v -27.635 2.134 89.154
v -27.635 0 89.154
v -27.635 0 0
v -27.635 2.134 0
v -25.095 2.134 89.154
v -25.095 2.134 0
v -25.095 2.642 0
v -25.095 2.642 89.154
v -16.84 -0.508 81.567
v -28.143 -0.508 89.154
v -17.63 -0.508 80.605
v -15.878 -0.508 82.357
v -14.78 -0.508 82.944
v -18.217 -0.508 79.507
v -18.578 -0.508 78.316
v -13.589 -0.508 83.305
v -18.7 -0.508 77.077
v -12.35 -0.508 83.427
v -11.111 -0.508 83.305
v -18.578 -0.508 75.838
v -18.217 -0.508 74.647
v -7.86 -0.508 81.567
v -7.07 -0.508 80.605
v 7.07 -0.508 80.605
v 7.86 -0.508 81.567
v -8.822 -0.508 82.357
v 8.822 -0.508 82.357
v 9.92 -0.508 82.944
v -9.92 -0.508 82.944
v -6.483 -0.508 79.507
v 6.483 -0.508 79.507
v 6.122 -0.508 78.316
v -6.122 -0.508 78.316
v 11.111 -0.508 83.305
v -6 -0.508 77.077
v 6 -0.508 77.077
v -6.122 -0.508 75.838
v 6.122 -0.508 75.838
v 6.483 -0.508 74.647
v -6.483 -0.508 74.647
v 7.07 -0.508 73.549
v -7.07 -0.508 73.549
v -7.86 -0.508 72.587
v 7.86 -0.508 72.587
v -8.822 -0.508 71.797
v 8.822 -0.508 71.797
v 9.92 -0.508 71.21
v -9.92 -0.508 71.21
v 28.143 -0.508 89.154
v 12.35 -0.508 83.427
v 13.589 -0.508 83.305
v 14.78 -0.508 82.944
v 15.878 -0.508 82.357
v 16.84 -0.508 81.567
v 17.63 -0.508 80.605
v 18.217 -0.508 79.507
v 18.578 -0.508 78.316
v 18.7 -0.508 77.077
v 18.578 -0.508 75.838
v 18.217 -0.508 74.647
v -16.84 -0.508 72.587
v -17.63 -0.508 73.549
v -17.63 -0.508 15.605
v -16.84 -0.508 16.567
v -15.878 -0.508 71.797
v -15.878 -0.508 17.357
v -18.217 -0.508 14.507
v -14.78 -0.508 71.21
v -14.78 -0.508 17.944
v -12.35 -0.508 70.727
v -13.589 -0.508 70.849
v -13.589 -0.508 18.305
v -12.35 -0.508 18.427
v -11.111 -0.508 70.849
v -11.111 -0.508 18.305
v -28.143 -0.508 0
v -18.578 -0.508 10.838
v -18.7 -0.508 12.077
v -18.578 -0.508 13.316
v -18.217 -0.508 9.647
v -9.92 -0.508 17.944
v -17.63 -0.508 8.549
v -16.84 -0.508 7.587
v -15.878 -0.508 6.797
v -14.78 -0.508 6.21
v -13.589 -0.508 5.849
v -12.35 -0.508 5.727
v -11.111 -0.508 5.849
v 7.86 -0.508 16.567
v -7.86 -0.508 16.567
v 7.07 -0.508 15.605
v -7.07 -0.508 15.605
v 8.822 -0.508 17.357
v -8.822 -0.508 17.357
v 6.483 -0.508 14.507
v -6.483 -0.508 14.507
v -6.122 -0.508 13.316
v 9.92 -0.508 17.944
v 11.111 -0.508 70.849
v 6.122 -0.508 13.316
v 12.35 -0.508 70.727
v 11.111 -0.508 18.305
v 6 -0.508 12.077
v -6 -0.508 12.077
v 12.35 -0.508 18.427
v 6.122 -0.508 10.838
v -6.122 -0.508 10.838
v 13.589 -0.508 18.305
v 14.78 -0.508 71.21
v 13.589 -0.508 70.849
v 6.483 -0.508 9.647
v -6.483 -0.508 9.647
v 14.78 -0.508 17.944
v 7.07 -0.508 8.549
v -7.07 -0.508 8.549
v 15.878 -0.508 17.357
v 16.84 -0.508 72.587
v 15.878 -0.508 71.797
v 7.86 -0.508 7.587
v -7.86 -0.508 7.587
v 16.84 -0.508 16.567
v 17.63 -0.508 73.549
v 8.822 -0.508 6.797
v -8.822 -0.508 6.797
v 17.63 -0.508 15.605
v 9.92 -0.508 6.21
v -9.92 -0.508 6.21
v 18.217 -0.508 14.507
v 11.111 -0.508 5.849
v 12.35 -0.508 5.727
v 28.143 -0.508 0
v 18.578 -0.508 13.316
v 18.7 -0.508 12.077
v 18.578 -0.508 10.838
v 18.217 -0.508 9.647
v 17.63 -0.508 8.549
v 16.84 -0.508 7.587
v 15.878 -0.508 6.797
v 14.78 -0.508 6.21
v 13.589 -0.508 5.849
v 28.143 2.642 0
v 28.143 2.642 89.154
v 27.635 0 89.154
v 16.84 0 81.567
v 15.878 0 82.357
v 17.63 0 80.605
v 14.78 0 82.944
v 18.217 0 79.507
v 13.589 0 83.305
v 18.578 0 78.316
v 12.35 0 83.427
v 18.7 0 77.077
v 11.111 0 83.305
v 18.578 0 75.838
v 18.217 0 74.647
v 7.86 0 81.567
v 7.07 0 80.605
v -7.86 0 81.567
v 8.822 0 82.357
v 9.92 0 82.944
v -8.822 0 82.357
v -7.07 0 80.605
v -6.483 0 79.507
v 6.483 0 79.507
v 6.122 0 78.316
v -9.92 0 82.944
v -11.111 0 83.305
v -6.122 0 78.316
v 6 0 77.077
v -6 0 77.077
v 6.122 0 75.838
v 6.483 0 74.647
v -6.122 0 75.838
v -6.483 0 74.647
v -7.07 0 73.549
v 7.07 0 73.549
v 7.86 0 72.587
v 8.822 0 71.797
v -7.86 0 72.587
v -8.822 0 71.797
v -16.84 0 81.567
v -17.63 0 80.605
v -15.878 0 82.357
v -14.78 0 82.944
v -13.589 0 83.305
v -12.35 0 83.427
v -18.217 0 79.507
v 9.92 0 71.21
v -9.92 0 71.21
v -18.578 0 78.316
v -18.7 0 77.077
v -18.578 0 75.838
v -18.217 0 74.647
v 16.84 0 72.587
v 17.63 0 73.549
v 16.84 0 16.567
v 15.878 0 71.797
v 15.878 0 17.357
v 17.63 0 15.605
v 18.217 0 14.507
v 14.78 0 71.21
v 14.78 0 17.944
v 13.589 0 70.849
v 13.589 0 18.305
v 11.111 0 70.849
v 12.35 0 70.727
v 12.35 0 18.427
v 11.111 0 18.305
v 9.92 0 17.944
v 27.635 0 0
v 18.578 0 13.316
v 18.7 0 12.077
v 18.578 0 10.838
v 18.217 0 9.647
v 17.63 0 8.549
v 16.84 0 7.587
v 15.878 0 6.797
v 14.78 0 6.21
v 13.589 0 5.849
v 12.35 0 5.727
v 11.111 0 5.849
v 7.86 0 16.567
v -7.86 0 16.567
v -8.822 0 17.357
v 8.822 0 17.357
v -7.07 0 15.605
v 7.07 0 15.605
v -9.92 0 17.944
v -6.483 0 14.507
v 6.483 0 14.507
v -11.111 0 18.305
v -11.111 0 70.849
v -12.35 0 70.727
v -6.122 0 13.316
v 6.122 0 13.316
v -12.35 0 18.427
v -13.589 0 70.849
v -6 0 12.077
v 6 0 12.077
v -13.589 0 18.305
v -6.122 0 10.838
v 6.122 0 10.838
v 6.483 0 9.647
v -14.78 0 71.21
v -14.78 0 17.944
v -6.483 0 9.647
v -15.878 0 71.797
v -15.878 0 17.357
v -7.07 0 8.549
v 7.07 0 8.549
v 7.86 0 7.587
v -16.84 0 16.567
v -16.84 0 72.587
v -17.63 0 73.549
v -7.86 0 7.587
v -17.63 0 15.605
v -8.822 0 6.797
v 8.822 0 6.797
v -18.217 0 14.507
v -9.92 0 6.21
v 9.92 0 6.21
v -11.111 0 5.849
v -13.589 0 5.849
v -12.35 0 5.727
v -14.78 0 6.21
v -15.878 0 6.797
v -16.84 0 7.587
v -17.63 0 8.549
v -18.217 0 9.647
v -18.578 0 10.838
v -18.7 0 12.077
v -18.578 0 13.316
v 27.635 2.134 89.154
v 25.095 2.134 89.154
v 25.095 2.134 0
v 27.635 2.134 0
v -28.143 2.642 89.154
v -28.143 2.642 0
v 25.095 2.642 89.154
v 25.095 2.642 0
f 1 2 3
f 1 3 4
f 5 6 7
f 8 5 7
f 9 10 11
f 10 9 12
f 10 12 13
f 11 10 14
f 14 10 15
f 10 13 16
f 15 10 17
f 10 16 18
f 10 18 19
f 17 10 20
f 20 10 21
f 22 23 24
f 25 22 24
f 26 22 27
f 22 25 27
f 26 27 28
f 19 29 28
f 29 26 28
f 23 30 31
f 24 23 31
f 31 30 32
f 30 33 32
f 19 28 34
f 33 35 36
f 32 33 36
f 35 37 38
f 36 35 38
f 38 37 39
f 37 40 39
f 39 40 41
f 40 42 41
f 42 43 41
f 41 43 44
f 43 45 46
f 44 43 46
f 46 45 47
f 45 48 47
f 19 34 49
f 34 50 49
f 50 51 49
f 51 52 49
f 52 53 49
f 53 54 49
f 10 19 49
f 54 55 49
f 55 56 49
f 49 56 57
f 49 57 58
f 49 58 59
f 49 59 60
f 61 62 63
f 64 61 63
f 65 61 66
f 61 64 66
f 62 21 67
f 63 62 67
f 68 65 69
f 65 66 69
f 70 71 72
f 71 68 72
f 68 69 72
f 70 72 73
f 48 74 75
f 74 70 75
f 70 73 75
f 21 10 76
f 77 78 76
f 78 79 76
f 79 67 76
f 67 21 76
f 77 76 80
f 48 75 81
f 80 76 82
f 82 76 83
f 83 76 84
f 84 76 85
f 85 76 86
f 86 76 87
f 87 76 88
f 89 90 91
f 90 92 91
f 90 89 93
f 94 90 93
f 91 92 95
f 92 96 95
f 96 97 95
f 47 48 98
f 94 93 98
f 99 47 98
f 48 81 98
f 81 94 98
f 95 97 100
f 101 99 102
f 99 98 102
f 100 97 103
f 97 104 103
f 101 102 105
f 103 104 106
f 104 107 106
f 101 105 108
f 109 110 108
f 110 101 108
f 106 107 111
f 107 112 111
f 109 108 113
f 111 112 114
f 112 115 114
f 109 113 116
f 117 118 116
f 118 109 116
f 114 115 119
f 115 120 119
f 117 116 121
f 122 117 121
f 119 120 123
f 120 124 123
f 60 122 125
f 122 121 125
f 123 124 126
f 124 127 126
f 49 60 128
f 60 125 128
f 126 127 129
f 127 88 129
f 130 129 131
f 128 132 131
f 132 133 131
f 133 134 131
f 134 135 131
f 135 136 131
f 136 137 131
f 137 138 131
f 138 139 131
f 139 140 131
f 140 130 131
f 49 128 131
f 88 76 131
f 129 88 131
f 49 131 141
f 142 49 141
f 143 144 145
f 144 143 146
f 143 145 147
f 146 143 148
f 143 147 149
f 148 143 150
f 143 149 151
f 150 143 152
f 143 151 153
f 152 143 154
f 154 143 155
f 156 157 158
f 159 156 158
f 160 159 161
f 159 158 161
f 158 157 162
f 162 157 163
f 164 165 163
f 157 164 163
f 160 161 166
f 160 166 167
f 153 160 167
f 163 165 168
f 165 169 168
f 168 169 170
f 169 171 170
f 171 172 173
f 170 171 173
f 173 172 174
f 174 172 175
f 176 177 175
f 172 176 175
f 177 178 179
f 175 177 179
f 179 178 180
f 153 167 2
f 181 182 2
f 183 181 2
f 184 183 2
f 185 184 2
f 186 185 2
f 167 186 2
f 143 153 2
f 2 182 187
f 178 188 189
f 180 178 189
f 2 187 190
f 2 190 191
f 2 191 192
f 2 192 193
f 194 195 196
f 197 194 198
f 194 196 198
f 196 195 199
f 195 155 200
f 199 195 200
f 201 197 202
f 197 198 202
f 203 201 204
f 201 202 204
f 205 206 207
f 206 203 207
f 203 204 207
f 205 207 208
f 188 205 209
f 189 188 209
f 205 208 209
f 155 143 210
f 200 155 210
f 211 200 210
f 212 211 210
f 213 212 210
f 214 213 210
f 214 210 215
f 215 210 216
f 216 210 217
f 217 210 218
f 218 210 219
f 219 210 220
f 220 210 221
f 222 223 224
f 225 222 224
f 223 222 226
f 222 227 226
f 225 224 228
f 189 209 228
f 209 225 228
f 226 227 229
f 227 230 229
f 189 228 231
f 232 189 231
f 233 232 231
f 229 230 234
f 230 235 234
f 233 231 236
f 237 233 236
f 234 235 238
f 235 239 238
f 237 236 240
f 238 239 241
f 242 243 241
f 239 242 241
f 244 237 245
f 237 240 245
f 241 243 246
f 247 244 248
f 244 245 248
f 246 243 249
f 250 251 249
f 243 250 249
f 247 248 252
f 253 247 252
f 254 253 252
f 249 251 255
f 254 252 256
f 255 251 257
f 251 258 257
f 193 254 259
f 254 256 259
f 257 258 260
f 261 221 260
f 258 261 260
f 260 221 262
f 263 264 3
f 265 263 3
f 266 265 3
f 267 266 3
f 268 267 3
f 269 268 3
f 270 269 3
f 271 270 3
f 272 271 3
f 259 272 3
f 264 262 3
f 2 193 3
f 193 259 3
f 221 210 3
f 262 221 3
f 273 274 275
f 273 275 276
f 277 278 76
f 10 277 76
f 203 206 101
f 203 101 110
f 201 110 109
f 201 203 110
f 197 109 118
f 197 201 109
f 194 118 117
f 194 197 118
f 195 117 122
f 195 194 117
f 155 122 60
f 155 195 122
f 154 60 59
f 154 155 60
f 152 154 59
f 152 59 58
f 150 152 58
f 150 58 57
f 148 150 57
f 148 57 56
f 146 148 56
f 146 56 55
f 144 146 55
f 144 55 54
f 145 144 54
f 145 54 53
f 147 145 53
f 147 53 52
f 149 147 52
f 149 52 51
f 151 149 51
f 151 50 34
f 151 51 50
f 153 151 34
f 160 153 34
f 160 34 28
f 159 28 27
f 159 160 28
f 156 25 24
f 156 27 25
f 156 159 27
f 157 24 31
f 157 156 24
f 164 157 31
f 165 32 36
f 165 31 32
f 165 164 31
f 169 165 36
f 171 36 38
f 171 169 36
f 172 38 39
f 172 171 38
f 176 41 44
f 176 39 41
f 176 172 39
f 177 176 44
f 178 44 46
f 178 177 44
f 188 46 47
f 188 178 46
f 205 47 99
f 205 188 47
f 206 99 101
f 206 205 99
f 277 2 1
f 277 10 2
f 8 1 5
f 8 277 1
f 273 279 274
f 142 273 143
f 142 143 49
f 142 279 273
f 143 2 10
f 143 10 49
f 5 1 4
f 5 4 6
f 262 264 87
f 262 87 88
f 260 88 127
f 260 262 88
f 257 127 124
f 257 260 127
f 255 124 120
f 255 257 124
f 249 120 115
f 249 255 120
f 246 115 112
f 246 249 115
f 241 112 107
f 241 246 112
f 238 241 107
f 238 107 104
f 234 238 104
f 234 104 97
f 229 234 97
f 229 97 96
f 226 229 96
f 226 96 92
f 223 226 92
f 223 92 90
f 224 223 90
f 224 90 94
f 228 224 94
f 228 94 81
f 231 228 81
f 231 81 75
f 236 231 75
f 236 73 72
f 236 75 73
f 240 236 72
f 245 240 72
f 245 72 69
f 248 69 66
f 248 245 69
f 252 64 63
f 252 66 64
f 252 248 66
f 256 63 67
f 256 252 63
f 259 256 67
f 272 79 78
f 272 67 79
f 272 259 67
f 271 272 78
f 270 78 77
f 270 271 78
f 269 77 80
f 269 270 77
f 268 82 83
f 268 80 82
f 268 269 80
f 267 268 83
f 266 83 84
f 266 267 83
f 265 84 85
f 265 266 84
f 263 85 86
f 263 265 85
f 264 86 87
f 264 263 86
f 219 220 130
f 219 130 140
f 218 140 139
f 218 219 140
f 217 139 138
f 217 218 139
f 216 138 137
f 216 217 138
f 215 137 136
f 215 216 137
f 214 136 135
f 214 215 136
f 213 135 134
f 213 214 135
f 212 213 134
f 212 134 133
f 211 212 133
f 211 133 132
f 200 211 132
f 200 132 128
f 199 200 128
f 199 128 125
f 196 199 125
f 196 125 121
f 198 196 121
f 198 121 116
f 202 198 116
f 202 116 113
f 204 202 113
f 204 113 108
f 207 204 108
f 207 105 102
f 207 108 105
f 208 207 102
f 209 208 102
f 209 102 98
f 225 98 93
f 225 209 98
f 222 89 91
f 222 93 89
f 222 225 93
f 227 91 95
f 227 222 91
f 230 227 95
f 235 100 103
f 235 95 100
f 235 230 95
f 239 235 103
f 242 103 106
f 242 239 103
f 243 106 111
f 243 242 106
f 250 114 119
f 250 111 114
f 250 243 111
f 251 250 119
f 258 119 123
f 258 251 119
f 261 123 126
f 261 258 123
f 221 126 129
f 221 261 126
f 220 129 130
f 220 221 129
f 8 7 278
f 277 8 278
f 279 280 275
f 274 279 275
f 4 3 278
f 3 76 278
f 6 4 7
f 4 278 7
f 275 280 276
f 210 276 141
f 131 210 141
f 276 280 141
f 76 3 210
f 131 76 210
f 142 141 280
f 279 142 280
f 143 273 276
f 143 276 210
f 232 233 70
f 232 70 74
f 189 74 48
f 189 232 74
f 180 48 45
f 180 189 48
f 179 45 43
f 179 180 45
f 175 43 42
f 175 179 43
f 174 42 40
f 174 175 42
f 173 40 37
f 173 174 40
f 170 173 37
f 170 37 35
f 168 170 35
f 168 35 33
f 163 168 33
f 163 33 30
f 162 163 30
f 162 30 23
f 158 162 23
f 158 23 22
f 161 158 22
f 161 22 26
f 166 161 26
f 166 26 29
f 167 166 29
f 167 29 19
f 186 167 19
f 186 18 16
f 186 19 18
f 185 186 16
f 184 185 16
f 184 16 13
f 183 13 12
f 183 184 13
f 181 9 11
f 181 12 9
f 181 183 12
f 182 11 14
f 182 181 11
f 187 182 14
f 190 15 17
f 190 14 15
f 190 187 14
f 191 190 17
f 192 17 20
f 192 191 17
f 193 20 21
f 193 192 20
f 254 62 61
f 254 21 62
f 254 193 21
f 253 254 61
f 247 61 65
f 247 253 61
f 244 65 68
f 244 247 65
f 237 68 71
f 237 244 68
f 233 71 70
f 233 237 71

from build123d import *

# Parameters (mm, degrees)
EXTRUDE_THIN3_DEPTH     = 89.154
CUT_EXTRUDE1_DEPTH      = 94.54354816
CUT_EXTRUDE1_DEPTH_BACK = 94.54354816
SKETCH8_R               = 6.35


with BuildPart() as part:
    # Sketch6 → Extrude-Thin3 (new body)
    with BuildSketch(Plane.XY):
        Polygon((25.0952, 2.1336), (27.6352, 2.1336), (27.6352, 0), (-27.6352, 0), (-27.6352, 2.1336), (-25.0952, 2.1336), (-25.0952, 2.6416), (-28.1432, 2.6416), (-28.1432, -0.508), (28.1432, -0.508), (28.1432, 2.6416), (25.0952, 2.6416), align=None)
    extrude(amount=EXTRUDE_THIN3_DEPTH)

    # Sketch8 → Cut-Extrude1 (cut, two sides: drawn at the far end of the back side and taken through both)
    with BuildSketch(Plane.XZ.offset(0.508).offset(-CUT_EXTRUDE1_DEPTH_BACK)):
        with Locations(Location((12.35, 77.077, 0), (0, 0, 270))):
            Circle(SKETCH8_R)
        with Locations(Location((-12.35, 77.077, 0), (0, 0, 270))):
            Circle(SKETCH8_R)
        with Locations(Location((-12.35, 12.077, 0), (0, 0, 270))):
            Circle(SKETCH8_R)
        with Locations(Location((12.35, 12.077, 0), (0, 0, 270))):
            Circle(SKETCH8_R)
    extrude(amount=CUT_EXTRUDE1_DEPTH + CUT_EXTRUDE1_DEPTH_BACK, mode=Mode.SUBTRACT)


solid = part.part
